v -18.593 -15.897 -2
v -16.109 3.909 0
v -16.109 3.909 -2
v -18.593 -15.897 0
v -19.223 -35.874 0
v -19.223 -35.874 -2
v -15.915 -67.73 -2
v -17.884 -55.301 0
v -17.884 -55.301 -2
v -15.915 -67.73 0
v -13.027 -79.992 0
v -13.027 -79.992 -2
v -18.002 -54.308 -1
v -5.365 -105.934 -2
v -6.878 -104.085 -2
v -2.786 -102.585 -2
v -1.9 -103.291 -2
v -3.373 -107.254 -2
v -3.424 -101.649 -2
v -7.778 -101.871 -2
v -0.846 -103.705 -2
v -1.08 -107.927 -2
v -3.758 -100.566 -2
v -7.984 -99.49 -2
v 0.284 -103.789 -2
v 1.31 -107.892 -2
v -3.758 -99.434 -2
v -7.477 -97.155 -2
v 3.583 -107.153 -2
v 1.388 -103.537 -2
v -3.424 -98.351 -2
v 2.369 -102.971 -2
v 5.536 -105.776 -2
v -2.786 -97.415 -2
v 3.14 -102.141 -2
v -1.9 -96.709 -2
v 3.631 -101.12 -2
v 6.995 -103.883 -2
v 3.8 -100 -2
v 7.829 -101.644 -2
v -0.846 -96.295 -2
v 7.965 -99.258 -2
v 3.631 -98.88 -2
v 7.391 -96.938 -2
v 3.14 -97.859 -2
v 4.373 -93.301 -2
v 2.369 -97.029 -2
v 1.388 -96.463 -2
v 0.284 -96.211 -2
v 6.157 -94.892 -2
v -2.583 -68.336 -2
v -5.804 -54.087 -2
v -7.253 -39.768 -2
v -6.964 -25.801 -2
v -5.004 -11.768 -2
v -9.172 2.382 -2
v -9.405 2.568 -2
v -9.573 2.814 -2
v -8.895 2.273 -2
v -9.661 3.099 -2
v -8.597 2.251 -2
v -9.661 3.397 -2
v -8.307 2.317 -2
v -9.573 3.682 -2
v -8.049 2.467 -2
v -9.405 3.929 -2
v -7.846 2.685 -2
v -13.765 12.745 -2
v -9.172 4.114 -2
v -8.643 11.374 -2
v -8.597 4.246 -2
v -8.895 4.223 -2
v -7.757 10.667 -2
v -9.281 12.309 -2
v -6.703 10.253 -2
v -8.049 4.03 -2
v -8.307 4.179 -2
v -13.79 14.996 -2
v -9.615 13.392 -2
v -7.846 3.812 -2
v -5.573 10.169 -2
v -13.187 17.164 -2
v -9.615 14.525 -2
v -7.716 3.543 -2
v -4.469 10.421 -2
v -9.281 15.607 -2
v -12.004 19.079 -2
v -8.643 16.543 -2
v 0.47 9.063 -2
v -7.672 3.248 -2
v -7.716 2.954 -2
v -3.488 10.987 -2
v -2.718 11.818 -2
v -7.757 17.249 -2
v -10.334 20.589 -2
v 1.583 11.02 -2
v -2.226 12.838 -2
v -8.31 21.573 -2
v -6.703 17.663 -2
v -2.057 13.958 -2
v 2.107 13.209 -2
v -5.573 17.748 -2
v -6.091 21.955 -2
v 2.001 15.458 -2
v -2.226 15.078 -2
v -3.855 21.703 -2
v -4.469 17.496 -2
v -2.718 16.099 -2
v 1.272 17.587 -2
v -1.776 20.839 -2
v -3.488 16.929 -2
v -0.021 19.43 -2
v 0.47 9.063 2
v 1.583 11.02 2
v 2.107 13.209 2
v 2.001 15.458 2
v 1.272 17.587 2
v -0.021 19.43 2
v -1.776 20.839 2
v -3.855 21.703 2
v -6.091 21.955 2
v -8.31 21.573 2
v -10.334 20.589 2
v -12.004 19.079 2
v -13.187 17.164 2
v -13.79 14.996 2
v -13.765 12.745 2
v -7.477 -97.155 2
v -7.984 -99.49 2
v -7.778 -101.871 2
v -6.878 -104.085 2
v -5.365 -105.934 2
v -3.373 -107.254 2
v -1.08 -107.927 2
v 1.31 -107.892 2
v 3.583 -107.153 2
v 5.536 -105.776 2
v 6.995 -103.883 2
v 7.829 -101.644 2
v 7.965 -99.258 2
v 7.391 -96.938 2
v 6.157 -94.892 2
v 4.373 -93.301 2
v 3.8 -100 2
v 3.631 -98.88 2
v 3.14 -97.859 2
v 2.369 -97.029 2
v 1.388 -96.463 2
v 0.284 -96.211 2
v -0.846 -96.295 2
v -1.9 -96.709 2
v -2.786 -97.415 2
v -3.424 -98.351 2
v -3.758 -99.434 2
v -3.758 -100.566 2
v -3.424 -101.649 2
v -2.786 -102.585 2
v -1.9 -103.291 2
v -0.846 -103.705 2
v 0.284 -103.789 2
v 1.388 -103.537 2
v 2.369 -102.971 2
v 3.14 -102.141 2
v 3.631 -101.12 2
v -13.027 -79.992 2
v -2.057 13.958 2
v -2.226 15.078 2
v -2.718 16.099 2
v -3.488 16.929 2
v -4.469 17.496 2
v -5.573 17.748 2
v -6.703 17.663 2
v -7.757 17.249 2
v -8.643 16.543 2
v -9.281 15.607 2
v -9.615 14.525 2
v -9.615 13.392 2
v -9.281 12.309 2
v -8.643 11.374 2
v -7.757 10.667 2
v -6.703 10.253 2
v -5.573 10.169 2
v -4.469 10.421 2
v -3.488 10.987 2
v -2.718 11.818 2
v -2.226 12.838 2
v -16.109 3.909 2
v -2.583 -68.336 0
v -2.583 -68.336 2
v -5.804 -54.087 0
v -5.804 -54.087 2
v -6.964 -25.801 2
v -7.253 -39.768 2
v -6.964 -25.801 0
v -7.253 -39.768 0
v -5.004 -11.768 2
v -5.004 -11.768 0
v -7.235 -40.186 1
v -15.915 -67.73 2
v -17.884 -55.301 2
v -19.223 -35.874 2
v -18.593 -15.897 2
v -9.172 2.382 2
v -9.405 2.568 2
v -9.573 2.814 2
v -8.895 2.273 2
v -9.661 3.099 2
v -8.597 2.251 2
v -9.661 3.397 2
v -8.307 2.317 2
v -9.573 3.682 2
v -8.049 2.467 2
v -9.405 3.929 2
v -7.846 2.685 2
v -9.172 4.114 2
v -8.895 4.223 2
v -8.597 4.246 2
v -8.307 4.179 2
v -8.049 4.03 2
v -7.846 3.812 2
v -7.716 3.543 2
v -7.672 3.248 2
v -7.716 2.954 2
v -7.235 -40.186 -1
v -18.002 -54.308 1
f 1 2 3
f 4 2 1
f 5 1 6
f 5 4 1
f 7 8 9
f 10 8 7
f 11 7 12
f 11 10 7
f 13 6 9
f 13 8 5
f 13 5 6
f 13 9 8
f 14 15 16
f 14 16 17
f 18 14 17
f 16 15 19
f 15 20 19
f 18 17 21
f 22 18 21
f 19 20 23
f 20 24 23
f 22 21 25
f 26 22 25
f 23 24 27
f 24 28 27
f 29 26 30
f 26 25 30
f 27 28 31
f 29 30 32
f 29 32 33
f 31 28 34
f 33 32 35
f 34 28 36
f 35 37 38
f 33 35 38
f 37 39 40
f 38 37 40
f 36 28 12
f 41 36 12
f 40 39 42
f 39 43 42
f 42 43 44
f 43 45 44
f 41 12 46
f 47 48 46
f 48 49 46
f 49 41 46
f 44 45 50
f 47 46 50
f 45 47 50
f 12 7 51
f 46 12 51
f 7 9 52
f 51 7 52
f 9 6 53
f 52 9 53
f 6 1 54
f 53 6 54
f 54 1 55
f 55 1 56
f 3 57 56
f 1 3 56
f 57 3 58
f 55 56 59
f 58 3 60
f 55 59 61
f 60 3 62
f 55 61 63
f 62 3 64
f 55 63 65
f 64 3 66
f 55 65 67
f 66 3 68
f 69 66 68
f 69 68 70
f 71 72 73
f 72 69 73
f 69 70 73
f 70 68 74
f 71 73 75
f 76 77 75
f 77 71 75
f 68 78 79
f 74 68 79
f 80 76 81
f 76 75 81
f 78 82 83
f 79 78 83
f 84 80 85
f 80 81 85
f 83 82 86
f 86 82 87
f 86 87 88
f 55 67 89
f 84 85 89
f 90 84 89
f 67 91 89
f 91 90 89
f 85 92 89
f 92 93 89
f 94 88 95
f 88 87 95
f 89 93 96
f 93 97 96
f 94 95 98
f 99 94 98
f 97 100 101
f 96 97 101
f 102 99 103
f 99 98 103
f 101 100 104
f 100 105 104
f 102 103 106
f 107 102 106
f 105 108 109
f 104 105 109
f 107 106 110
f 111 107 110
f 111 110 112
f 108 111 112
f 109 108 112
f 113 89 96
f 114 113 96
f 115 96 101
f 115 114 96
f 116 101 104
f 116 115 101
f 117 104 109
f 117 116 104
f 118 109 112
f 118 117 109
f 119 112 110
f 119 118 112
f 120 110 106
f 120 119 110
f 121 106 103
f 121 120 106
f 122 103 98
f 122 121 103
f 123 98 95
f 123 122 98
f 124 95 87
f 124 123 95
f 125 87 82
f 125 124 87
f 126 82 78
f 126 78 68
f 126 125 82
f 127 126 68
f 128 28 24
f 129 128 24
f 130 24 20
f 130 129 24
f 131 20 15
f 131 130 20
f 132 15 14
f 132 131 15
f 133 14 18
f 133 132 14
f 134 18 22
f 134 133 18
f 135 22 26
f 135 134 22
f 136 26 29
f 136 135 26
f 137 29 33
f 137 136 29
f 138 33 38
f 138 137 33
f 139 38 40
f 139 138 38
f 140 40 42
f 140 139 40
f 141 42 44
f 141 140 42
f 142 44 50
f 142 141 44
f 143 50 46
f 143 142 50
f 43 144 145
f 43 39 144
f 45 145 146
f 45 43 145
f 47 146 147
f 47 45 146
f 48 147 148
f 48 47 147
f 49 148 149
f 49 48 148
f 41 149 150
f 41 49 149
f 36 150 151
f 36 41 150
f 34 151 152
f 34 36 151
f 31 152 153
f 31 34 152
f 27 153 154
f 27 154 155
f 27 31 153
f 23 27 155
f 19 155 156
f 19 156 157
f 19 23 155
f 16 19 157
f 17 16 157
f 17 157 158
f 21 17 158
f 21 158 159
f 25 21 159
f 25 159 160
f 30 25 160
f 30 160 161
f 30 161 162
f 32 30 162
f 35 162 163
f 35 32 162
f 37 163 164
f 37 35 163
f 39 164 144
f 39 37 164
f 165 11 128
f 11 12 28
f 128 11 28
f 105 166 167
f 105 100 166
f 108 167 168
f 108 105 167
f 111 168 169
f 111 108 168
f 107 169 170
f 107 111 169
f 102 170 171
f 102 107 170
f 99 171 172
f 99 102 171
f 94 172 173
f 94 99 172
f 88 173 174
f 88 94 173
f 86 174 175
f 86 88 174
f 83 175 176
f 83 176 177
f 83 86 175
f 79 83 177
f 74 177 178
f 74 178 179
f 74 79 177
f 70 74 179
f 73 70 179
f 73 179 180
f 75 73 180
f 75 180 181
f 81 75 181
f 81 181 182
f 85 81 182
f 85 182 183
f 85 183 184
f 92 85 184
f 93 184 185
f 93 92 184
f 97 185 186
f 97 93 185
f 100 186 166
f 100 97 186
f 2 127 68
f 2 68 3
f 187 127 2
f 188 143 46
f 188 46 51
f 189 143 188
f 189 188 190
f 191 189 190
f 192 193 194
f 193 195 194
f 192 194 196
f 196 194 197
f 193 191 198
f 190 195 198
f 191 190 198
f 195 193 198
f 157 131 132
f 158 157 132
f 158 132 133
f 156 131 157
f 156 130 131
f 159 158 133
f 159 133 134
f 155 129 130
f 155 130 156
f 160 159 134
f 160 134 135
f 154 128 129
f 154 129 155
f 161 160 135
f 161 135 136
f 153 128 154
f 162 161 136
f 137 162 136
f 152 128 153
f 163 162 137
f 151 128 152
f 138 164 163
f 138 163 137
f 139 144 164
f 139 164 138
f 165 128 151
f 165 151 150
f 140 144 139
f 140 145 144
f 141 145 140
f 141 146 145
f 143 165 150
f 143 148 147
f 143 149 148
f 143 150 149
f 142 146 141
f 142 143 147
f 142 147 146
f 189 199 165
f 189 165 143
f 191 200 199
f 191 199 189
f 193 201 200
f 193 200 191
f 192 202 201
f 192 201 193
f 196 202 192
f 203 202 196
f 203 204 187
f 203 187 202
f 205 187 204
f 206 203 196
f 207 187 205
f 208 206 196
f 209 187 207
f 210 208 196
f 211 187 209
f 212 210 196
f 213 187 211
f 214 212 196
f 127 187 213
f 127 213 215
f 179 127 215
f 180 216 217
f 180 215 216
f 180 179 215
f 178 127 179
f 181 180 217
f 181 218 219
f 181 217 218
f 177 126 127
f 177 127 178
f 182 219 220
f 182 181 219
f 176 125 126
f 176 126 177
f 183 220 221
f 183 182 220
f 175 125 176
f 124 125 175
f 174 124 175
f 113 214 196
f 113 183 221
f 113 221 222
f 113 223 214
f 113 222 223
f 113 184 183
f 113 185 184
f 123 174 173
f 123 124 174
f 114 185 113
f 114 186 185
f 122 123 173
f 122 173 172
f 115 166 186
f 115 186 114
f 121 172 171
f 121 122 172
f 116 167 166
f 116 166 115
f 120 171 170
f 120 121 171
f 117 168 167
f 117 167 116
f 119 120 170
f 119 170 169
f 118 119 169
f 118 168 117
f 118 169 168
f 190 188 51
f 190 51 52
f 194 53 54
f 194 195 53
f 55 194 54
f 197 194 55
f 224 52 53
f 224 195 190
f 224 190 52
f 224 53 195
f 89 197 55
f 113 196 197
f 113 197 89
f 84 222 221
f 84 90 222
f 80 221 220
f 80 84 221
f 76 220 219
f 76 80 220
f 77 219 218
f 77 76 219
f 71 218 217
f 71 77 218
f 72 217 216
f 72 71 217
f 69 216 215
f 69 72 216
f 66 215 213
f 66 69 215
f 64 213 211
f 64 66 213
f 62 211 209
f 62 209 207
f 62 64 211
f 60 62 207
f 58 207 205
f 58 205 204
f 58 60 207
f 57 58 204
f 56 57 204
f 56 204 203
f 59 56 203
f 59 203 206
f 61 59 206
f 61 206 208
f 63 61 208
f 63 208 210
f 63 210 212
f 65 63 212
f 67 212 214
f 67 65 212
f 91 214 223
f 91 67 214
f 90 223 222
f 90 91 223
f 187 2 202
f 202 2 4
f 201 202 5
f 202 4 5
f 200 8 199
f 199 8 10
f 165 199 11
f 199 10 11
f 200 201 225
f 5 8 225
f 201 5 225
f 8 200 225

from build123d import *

# Parameters (mm, degrees)
SKETCH1_R           = 1
SKETCH1_W           = 7.92
SKETCH1_H           = 7.92
SKETCH1_R_2         = 3.8
BOSS_EXTRUDE1_DEPTH = 2
SKETCH2_R           = 8
SKETCH2_W           = 7.92
SKETCH2_H           = 7.92
BOSS_EXTRUDE2_DEPTH = 2


with BuildPart() as part:
    # Sketch1 → Boss-Extrude1 (new body, symmetric)
    with BuildSketch(Plane.XY):
        with BuildLine():
            Line((-5.004193268, -11.768083729), (1.264827755, 12.086469882))
            ThreePointArc((1.264827755, 12.086469882), (-3.646245645, 20.982534185), (-12.767631248, 16.503814873))
            Line((-12.767631248, 16.503814873), (-16.10900409, 3.908669428))
            add(Edge.make_bspline(
                [(-16.10900409, 3.908669428), (-19.377716834, -15.242508961), (-20.646085271, -43.801923377), (-15.357286602, -71.564124193), (-13.027019985, -79.992281382)],
                knots=[0, 0, 0, 0, 0.615830564, 0.891753854, 0.891753854, 0.891753854, 0.891753854], degree=3))
            Line((-13.027019985, -79.992281382), (-5.967709179, -101.821397306))
            ThreePointArc((-5.967709179, -101.821397306), (-2.543292548, -94.302394888), (5.340555406, -96.773622937))
            Line((5.340555406, -96.773622937), (-2.58265982, -68.335822015))
            add(Edge.make_bspline(
                [(-2.58265982, -68.335822015), (-10.677441901, -40.31981723), (-5.004193268, -11.768083729)],
                knots=[0, 0, 0, 1, 1, 1], degree=2))
        make_face()
        with Locations((-8.672039016, 3.248347704)):
            Circle(SKETCH1_R, mode=Mode.SUBTRACT)
        with Locations((-5.857463234, 13.958219751)):
            Rectangle(SKETCH1_W, SKETCH1_H, mode=Mode.SUBTRACT)
        with BuildLine():
            ThreePointArc((6.239474416, -100), (6.010544893, -98.325368373), (5.340555406, -96.773622937))
            ThreePointArc((5.340555406, -96.773622937), (-2.543292548, -94.302394888), (-5.967709179, -101.821397306))
            ThreePointArc((-5.967709179, -101.821397306), (0.92078017, -106.171159119), (6.239474416, -100))
        make_face()
        with Locations((0, -100)):
            Rectangle(SKETCH1_W, SKETCH1_H, mode=Mode.SUBTRACT)
        with Locations((0, -100)):
            Rectangle(SKETCH1_W, SKETCH1_H)
        with Locations((0, -100)):
            Circle(SKETCH1_R_2, mode=Mode.SUBTRACT)
        with Locations((-5.857463234, 13.958219751)):
            Rectangle(SKETCH1_W, SKETCH1_H)
        with Locations((-5.857463234, 13.958219751)):
            Circle(SKETCH1_R_2, mode=Mode.SUBTRACT)
    extrude(amount=BOSS_EXTRUDE1_DEPTH, both=True)

    # Sketch2 → Boss-Extrude2 (add, symmetric)
    with BuildSketch(Plane.XY):
        with Locations((0, -100)):
            Circle(SKETCH2_R)
        with Locations((0, -100)):
            Rectangle(SKETCH2_W, SKETCH2_H, mode=Mode.SUBTRACT)
        with Locations((-5.857463234, 13.958219751)):
            Circle(SKETCH2_R)
        with Locations((-5.857463234, 13.958219751)):
            Rectangle(SKETCH2_W, SKETCH2_H, mode=Mode.SUBTRACT)
    extrude(amount=BOSS_EXTRUDE2_DEPTH, both=True)


solid = part.part
